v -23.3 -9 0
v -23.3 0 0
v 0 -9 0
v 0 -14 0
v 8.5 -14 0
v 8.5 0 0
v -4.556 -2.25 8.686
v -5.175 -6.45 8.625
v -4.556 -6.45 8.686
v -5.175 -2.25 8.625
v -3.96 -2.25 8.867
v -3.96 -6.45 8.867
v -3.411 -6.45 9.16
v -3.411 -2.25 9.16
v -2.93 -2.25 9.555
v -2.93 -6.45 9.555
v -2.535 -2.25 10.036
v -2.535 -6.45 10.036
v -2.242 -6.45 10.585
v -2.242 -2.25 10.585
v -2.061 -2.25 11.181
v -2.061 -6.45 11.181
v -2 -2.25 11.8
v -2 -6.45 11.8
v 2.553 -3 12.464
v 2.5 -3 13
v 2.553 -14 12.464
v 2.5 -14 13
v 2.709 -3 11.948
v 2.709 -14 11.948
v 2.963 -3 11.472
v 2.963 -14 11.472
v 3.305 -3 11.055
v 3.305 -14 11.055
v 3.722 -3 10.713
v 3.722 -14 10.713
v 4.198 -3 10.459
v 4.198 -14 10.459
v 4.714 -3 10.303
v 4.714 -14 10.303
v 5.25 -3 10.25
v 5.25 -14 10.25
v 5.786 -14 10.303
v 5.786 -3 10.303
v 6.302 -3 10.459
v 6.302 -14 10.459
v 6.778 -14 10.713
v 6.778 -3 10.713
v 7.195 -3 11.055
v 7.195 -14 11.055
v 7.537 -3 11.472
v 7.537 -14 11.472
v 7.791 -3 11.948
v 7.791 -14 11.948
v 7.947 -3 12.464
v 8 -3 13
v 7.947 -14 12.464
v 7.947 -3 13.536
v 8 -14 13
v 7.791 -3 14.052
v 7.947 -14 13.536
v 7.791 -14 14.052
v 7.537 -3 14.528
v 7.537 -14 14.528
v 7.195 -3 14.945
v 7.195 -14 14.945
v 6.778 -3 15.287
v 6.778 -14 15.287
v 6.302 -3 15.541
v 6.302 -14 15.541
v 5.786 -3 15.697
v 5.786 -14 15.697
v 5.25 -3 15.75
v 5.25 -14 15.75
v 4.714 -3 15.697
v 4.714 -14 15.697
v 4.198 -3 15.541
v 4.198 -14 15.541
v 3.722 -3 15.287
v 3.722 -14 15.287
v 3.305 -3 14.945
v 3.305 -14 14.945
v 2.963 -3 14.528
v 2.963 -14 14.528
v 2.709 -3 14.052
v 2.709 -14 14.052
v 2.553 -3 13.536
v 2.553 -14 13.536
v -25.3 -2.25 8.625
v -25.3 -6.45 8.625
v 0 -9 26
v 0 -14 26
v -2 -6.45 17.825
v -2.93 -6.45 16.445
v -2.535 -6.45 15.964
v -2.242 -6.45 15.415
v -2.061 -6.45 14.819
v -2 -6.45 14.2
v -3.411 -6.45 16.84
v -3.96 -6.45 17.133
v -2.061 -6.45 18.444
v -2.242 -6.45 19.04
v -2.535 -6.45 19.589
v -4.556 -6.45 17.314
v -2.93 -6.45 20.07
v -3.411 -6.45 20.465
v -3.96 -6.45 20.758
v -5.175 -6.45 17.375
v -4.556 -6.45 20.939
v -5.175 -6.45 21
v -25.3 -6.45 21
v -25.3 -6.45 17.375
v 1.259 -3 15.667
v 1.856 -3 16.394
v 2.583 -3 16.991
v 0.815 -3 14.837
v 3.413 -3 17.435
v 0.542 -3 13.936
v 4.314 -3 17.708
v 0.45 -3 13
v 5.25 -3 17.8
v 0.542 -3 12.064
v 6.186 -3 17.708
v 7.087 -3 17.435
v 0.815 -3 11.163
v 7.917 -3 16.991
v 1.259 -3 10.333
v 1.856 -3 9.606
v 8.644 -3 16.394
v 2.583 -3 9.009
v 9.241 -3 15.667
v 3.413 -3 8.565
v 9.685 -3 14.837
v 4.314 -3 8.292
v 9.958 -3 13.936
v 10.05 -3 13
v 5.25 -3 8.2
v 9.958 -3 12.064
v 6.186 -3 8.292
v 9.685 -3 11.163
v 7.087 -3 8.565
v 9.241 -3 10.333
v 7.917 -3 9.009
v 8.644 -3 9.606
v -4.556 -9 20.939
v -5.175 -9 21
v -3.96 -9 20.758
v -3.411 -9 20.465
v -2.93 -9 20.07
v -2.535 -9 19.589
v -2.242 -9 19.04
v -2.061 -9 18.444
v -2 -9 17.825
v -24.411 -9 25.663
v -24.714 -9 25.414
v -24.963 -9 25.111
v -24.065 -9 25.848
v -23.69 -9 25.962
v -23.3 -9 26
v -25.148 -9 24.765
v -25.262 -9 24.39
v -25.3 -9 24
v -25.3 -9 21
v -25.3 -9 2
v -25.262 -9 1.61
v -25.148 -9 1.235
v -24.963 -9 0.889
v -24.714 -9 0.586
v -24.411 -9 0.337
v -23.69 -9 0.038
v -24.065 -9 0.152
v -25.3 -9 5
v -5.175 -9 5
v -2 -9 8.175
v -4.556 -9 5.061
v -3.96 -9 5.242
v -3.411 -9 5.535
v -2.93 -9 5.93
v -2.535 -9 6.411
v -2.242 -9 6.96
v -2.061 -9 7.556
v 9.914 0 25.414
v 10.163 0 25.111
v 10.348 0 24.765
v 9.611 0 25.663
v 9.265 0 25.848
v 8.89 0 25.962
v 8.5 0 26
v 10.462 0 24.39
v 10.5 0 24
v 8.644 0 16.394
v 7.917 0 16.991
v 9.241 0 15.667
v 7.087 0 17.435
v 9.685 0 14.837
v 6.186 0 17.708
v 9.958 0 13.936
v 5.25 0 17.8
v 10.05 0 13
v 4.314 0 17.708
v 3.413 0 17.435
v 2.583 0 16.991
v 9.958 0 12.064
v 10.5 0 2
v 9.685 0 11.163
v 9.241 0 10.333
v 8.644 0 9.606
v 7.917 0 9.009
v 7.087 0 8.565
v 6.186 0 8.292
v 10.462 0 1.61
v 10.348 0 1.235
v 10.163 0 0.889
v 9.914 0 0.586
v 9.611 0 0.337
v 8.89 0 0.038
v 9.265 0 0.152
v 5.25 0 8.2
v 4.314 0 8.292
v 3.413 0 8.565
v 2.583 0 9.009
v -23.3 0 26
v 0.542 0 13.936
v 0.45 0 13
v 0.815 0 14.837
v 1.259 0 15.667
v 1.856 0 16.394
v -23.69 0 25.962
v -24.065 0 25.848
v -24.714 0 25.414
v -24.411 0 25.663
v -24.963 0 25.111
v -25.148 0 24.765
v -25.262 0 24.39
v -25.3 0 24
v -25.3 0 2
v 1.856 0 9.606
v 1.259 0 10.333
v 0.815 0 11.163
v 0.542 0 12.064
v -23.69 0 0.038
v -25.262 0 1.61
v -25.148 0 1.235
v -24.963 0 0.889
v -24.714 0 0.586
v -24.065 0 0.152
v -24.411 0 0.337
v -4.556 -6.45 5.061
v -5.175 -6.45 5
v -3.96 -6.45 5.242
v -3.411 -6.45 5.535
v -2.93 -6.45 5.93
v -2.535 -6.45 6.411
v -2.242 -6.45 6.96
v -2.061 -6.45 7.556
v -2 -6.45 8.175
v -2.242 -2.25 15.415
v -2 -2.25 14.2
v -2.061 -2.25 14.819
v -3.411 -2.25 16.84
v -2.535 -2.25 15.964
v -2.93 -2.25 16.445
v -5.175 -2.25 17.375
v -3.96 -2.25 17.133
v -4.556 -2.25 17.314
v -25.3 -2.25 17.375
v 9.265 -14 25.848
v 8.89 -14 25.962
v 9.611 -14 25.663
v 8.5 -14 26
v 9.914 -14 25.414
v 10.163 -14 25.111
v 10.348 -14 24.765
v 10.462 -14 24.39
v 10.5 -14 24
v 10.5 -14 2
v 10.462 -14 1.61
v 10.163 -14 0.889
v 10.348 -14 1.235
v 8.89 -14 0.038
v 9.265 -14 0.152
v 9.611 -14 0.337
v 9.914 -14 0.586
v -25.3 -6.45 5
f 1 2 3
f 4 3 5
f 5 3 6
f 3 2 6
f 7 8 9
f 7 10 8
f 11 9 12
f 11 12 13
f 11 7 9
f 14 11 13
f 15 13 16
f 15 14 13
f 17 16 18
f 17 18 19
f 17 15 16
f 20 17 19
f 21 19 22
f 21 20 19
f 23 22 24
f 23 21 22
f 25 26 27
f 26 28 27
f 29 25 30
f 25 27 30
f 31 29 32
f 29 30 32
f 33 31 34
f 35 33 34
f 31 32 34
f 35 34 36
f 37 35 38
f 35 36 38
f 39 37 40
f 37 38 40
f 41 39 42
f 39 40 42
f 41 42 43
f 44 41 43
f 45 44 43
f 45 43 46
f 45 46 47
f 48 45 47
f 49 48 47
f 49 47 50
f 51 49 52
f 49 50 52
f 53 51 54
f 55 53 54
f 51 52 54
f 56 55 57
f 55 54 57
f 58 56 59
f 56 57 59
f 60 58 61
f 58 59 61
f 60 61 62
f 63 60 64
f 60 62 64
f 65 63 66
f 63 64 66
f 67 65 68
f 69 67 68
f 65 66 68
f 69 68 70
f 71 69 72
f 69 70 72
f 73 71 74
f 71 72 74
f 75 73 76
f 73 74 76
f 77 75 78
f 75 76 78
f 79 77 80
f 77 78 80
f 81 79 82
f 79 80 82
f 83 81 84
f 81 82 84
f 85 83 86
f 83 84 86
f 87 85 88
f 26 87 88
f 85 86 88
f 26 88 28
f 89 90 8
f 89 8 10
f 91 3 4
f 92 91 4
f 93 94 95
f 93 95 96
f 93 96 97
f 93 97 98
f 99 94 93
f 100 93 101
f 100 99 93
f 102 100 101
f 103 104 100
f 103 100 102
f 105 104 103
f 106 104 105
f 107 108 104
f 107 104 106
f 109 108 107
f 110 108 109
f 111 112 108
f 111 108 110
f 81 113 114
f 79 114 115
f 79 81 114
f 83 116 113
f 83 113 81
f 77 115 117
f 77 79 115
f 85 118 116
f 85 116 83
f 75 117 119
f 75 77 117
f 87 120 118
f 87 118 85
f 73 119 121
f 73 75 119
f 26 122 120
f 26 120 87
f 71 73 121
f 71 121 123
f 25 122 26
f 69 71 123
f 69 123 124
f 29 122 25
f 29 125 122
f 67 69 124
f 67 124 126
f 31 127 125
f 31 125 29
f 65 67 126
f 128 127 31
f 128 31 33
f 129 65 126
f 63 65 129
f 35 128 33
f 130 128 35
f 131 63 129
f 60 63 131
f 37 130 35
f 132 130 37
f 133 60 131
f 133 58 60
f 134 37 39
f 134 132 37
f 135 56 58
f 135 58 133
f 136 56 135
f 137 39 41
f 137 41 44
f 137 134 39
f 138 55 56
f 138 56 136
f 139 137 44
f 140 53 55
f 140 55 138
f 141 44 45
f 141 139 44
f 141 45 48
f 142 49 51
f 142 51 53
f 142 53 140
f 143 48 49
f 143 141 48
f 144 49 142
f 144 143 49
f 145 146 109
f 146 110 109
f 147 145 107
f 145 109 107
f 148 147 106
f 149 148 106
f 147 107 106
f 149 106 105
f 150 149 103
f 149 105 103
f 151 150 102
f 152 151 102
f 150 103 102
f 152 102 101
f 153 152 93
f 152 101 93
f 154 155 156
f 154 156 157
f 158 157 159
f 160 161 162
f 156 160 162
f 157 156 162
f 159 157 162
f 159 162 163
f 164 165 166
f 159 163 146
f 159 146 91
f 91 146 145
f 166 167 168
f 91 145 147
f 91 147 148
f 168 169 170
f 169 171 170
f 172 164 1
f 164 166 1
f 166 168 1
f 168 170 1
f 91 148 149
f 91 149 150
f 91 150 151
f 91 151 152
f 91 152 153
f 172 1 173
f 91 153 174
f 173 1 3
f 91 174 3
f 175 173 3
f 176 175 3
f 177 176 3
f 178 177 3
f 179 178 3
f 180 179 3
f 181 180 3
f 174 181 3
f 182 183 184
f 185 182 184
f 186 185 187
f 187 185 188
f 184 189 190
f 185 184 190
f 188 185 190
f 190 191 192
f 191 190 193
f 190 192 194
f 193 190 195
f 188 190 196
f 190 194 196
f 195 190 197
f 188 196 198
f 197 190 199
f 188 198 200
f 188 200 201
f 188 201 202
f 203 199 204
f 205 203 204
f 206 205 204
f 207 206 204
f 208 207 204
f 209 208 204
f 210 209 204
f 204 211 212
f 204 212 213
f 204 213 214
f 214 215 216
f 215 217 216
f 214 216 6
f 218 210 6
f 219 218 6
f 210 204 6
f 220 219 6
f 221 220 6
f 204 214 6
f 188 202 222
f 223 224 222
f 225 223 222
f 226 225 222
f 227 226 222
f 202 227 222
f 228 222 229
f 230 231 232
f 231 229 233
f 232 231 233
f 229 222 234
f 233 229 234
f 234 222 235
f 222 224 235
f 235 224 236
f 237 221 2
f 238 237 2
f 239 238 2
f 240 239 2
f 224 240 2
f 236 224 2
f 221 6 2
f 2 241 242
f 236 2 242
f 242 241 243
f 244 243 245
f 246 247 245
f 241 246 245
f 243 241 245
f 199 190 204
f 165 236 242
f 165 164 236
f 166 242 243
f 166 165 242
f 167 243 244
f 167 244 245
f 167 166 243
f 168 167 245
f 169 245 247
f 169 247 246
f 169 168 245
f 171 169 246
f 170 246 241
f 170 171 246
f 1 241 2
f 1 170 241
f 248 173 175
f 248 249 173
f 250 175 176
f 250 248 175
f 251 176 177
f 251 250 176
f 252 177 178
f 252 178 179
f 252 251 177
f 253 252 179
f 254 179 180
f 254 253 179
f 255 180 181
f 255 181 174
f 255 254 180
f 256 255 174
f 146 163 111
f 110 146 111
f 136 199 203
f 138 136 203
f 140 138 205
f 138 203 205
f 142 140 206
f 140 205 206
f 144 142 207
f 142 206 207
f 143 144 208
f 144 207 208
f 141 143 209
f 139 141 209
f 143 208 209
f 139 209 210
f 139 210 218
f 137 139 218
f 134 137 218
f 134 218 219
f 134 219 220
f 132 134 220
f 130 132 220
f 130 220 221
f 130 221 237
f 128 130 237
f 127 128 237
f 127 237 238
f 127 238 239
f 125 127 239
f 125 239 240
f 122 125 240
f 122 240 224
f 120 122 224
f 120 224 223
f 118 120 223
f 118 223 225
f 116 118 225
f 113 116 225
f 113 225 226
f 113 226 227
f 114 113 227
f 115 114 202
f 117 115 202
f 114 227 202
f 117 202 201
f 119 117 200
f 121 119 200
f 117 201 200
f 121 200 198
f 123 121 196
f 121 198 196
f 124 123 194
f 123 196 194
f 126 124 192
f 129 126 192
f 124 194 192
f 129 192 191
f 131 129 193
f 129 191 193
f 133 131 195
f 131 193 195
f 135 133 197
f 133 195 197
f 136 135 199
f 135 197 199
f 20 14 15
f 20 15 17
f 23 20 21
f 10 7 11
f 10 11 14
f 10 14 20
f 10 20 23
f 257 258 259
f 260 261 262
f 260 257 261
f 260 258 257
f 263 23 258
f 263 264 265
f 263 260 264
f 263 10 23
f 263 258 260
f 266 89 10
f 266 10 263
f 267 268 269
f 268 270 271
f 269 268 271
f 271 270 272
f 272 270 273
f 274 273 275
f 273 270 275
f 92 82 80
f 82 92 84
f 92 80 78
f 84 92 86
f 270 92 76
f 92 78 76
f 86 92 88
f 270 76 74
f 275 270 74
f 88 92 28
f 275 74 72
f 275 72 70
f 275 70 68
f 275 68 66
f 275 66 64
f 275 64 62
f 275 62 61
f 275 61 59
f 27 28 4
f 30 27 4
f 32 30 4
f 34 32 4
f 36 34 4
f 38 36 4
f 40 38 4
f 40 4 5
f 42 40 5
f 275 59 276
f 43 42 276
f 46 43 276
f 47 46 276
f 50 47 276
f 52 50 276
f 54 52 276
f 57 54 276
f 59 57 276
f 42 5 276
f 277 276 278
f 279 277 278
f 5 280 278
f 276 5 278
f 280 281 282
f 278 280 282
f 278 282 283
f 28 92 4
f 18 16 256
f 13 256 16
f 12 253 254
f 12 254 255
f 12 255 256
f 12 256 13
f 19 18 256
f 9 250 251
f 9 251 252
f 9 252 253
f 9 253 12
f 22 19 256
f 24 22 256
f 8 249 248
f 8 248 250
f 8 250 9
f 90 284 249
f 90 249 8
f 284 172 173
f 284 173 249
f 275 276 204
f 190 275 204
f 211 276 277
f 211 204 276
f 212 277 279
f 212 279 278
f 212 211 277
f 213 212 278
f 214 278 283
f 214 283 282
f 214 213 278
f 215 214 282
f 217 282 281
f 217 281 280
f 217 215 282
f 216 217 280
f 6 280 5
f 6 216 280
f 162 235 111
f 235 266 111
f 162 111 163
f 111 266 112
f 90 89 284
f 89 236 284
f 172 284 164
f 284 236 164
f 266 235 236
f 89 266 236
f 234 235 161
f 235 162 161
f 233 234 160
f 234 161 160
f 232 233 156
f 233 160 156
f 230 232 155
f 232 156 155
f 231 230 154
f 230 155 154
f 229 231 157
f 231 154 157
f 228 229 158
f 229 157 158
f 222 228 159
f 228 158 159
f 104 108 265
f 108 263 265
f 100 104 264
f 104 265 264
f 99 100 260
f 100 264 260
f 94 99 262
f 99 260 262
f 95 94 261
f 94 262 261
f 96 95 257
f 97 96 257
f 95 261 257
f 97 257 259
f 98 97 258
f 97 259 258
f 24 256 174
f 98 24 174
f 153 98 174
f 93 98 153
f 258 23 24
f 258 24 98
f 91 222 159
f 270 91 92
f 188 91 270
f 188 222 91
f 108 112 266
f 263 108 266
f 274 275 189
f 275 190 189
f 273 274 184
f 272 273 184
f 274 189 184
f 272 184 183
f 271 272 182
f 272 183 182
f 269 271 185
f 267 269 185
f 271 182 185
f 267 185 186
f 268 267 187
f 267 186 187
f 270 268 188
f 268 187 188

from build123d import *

# Parameters (mm, degrees)
BOSS_EXTRUDE1_DEPTH             = 26
FILLET2_R                       = 2
CBORE_FOR_M5_SBHCS1_D           = 5.5
CBORE_FOR_M5_SBHCS1_CBORE_D     = 9.6
CBORE_FOR_M5_SBHCS1_CBORE_DEPTH = 3
SKETCH10_W                      = 8.75
SKETCH10_H                      = 4.2
SKETCH10_W_2                    = 16
SKETCH10_H_2                    = 2.55
CUT_EXTRUDE3_DEPTH              = 23.3
FILLET6_R                       = 3.175


with BuildPart() as part:
    # Sketch1 → Boss-Extrude1 (new body)
    with BuildSketch(Plane.XY):
        Polygon((-25.3, 0), (-25.3, -9), (0, -9), (0, -14), (10.5, -14), (10.5, 0), (0, 0), align=None)
    extrude(amount=BOSS_EXTRUDE1_DEPTH)

    # Fillet2
    fillet2_edges = [part.edges().sort_by_distance(p)[0] for p in [
        (10.5, -7, 26),
        (10.5, -7, 0),
        (-25.3, -4.5, 26),
        (-25.3, -4.5, 0),
    ]]
    fillet(fillet2_edges, radius=FILLET2_R)

    # CBORE for M5 SBHCS1 (through all)
    with Locations(Plane(origin=(0, 0, 0), x_dir=(1, 0, 0), z_dir=(0, 1, 0))):
        with Locations((5.25, -13)):
            CounterBoreHole(CBORE_FOR_M5_SBHCS1_D / 2, CBORE_FOR_M5_SBHCS1_CBORE_D / 2, CBORE_FOR_M5_SBHCS1_CBORE_DEPTH)

    # Sketch10 → Cut-Extrude3 (cut)
    with BuildSketch(Plane.ZY.offset(25.3)):
        with Locations((13, -4.35)):
            Rectangle(SKETCH10_W, SKETCH10_H)
        with Locations((13, -7.725)):
            Rectangle(SKETCH10_W_2, SKETCH10_H_2)
    extrude(amount=-CUT_EXTRUDE3_DEPTH, mode=Mode.SUBTRACT)

    # Fillet6
    fillet6_edges = [part.edges().sort_by_distance(p)[0] for p in [
        (-2, -7.725, 21),
        (-2, -7.725, 5),
        (-2, -4.35, 8.625),
        (-2, -4.35, 17.375),
    ]]
    fillet(fillet6_edges, radius=FILLET6_R)


solid = part.part
